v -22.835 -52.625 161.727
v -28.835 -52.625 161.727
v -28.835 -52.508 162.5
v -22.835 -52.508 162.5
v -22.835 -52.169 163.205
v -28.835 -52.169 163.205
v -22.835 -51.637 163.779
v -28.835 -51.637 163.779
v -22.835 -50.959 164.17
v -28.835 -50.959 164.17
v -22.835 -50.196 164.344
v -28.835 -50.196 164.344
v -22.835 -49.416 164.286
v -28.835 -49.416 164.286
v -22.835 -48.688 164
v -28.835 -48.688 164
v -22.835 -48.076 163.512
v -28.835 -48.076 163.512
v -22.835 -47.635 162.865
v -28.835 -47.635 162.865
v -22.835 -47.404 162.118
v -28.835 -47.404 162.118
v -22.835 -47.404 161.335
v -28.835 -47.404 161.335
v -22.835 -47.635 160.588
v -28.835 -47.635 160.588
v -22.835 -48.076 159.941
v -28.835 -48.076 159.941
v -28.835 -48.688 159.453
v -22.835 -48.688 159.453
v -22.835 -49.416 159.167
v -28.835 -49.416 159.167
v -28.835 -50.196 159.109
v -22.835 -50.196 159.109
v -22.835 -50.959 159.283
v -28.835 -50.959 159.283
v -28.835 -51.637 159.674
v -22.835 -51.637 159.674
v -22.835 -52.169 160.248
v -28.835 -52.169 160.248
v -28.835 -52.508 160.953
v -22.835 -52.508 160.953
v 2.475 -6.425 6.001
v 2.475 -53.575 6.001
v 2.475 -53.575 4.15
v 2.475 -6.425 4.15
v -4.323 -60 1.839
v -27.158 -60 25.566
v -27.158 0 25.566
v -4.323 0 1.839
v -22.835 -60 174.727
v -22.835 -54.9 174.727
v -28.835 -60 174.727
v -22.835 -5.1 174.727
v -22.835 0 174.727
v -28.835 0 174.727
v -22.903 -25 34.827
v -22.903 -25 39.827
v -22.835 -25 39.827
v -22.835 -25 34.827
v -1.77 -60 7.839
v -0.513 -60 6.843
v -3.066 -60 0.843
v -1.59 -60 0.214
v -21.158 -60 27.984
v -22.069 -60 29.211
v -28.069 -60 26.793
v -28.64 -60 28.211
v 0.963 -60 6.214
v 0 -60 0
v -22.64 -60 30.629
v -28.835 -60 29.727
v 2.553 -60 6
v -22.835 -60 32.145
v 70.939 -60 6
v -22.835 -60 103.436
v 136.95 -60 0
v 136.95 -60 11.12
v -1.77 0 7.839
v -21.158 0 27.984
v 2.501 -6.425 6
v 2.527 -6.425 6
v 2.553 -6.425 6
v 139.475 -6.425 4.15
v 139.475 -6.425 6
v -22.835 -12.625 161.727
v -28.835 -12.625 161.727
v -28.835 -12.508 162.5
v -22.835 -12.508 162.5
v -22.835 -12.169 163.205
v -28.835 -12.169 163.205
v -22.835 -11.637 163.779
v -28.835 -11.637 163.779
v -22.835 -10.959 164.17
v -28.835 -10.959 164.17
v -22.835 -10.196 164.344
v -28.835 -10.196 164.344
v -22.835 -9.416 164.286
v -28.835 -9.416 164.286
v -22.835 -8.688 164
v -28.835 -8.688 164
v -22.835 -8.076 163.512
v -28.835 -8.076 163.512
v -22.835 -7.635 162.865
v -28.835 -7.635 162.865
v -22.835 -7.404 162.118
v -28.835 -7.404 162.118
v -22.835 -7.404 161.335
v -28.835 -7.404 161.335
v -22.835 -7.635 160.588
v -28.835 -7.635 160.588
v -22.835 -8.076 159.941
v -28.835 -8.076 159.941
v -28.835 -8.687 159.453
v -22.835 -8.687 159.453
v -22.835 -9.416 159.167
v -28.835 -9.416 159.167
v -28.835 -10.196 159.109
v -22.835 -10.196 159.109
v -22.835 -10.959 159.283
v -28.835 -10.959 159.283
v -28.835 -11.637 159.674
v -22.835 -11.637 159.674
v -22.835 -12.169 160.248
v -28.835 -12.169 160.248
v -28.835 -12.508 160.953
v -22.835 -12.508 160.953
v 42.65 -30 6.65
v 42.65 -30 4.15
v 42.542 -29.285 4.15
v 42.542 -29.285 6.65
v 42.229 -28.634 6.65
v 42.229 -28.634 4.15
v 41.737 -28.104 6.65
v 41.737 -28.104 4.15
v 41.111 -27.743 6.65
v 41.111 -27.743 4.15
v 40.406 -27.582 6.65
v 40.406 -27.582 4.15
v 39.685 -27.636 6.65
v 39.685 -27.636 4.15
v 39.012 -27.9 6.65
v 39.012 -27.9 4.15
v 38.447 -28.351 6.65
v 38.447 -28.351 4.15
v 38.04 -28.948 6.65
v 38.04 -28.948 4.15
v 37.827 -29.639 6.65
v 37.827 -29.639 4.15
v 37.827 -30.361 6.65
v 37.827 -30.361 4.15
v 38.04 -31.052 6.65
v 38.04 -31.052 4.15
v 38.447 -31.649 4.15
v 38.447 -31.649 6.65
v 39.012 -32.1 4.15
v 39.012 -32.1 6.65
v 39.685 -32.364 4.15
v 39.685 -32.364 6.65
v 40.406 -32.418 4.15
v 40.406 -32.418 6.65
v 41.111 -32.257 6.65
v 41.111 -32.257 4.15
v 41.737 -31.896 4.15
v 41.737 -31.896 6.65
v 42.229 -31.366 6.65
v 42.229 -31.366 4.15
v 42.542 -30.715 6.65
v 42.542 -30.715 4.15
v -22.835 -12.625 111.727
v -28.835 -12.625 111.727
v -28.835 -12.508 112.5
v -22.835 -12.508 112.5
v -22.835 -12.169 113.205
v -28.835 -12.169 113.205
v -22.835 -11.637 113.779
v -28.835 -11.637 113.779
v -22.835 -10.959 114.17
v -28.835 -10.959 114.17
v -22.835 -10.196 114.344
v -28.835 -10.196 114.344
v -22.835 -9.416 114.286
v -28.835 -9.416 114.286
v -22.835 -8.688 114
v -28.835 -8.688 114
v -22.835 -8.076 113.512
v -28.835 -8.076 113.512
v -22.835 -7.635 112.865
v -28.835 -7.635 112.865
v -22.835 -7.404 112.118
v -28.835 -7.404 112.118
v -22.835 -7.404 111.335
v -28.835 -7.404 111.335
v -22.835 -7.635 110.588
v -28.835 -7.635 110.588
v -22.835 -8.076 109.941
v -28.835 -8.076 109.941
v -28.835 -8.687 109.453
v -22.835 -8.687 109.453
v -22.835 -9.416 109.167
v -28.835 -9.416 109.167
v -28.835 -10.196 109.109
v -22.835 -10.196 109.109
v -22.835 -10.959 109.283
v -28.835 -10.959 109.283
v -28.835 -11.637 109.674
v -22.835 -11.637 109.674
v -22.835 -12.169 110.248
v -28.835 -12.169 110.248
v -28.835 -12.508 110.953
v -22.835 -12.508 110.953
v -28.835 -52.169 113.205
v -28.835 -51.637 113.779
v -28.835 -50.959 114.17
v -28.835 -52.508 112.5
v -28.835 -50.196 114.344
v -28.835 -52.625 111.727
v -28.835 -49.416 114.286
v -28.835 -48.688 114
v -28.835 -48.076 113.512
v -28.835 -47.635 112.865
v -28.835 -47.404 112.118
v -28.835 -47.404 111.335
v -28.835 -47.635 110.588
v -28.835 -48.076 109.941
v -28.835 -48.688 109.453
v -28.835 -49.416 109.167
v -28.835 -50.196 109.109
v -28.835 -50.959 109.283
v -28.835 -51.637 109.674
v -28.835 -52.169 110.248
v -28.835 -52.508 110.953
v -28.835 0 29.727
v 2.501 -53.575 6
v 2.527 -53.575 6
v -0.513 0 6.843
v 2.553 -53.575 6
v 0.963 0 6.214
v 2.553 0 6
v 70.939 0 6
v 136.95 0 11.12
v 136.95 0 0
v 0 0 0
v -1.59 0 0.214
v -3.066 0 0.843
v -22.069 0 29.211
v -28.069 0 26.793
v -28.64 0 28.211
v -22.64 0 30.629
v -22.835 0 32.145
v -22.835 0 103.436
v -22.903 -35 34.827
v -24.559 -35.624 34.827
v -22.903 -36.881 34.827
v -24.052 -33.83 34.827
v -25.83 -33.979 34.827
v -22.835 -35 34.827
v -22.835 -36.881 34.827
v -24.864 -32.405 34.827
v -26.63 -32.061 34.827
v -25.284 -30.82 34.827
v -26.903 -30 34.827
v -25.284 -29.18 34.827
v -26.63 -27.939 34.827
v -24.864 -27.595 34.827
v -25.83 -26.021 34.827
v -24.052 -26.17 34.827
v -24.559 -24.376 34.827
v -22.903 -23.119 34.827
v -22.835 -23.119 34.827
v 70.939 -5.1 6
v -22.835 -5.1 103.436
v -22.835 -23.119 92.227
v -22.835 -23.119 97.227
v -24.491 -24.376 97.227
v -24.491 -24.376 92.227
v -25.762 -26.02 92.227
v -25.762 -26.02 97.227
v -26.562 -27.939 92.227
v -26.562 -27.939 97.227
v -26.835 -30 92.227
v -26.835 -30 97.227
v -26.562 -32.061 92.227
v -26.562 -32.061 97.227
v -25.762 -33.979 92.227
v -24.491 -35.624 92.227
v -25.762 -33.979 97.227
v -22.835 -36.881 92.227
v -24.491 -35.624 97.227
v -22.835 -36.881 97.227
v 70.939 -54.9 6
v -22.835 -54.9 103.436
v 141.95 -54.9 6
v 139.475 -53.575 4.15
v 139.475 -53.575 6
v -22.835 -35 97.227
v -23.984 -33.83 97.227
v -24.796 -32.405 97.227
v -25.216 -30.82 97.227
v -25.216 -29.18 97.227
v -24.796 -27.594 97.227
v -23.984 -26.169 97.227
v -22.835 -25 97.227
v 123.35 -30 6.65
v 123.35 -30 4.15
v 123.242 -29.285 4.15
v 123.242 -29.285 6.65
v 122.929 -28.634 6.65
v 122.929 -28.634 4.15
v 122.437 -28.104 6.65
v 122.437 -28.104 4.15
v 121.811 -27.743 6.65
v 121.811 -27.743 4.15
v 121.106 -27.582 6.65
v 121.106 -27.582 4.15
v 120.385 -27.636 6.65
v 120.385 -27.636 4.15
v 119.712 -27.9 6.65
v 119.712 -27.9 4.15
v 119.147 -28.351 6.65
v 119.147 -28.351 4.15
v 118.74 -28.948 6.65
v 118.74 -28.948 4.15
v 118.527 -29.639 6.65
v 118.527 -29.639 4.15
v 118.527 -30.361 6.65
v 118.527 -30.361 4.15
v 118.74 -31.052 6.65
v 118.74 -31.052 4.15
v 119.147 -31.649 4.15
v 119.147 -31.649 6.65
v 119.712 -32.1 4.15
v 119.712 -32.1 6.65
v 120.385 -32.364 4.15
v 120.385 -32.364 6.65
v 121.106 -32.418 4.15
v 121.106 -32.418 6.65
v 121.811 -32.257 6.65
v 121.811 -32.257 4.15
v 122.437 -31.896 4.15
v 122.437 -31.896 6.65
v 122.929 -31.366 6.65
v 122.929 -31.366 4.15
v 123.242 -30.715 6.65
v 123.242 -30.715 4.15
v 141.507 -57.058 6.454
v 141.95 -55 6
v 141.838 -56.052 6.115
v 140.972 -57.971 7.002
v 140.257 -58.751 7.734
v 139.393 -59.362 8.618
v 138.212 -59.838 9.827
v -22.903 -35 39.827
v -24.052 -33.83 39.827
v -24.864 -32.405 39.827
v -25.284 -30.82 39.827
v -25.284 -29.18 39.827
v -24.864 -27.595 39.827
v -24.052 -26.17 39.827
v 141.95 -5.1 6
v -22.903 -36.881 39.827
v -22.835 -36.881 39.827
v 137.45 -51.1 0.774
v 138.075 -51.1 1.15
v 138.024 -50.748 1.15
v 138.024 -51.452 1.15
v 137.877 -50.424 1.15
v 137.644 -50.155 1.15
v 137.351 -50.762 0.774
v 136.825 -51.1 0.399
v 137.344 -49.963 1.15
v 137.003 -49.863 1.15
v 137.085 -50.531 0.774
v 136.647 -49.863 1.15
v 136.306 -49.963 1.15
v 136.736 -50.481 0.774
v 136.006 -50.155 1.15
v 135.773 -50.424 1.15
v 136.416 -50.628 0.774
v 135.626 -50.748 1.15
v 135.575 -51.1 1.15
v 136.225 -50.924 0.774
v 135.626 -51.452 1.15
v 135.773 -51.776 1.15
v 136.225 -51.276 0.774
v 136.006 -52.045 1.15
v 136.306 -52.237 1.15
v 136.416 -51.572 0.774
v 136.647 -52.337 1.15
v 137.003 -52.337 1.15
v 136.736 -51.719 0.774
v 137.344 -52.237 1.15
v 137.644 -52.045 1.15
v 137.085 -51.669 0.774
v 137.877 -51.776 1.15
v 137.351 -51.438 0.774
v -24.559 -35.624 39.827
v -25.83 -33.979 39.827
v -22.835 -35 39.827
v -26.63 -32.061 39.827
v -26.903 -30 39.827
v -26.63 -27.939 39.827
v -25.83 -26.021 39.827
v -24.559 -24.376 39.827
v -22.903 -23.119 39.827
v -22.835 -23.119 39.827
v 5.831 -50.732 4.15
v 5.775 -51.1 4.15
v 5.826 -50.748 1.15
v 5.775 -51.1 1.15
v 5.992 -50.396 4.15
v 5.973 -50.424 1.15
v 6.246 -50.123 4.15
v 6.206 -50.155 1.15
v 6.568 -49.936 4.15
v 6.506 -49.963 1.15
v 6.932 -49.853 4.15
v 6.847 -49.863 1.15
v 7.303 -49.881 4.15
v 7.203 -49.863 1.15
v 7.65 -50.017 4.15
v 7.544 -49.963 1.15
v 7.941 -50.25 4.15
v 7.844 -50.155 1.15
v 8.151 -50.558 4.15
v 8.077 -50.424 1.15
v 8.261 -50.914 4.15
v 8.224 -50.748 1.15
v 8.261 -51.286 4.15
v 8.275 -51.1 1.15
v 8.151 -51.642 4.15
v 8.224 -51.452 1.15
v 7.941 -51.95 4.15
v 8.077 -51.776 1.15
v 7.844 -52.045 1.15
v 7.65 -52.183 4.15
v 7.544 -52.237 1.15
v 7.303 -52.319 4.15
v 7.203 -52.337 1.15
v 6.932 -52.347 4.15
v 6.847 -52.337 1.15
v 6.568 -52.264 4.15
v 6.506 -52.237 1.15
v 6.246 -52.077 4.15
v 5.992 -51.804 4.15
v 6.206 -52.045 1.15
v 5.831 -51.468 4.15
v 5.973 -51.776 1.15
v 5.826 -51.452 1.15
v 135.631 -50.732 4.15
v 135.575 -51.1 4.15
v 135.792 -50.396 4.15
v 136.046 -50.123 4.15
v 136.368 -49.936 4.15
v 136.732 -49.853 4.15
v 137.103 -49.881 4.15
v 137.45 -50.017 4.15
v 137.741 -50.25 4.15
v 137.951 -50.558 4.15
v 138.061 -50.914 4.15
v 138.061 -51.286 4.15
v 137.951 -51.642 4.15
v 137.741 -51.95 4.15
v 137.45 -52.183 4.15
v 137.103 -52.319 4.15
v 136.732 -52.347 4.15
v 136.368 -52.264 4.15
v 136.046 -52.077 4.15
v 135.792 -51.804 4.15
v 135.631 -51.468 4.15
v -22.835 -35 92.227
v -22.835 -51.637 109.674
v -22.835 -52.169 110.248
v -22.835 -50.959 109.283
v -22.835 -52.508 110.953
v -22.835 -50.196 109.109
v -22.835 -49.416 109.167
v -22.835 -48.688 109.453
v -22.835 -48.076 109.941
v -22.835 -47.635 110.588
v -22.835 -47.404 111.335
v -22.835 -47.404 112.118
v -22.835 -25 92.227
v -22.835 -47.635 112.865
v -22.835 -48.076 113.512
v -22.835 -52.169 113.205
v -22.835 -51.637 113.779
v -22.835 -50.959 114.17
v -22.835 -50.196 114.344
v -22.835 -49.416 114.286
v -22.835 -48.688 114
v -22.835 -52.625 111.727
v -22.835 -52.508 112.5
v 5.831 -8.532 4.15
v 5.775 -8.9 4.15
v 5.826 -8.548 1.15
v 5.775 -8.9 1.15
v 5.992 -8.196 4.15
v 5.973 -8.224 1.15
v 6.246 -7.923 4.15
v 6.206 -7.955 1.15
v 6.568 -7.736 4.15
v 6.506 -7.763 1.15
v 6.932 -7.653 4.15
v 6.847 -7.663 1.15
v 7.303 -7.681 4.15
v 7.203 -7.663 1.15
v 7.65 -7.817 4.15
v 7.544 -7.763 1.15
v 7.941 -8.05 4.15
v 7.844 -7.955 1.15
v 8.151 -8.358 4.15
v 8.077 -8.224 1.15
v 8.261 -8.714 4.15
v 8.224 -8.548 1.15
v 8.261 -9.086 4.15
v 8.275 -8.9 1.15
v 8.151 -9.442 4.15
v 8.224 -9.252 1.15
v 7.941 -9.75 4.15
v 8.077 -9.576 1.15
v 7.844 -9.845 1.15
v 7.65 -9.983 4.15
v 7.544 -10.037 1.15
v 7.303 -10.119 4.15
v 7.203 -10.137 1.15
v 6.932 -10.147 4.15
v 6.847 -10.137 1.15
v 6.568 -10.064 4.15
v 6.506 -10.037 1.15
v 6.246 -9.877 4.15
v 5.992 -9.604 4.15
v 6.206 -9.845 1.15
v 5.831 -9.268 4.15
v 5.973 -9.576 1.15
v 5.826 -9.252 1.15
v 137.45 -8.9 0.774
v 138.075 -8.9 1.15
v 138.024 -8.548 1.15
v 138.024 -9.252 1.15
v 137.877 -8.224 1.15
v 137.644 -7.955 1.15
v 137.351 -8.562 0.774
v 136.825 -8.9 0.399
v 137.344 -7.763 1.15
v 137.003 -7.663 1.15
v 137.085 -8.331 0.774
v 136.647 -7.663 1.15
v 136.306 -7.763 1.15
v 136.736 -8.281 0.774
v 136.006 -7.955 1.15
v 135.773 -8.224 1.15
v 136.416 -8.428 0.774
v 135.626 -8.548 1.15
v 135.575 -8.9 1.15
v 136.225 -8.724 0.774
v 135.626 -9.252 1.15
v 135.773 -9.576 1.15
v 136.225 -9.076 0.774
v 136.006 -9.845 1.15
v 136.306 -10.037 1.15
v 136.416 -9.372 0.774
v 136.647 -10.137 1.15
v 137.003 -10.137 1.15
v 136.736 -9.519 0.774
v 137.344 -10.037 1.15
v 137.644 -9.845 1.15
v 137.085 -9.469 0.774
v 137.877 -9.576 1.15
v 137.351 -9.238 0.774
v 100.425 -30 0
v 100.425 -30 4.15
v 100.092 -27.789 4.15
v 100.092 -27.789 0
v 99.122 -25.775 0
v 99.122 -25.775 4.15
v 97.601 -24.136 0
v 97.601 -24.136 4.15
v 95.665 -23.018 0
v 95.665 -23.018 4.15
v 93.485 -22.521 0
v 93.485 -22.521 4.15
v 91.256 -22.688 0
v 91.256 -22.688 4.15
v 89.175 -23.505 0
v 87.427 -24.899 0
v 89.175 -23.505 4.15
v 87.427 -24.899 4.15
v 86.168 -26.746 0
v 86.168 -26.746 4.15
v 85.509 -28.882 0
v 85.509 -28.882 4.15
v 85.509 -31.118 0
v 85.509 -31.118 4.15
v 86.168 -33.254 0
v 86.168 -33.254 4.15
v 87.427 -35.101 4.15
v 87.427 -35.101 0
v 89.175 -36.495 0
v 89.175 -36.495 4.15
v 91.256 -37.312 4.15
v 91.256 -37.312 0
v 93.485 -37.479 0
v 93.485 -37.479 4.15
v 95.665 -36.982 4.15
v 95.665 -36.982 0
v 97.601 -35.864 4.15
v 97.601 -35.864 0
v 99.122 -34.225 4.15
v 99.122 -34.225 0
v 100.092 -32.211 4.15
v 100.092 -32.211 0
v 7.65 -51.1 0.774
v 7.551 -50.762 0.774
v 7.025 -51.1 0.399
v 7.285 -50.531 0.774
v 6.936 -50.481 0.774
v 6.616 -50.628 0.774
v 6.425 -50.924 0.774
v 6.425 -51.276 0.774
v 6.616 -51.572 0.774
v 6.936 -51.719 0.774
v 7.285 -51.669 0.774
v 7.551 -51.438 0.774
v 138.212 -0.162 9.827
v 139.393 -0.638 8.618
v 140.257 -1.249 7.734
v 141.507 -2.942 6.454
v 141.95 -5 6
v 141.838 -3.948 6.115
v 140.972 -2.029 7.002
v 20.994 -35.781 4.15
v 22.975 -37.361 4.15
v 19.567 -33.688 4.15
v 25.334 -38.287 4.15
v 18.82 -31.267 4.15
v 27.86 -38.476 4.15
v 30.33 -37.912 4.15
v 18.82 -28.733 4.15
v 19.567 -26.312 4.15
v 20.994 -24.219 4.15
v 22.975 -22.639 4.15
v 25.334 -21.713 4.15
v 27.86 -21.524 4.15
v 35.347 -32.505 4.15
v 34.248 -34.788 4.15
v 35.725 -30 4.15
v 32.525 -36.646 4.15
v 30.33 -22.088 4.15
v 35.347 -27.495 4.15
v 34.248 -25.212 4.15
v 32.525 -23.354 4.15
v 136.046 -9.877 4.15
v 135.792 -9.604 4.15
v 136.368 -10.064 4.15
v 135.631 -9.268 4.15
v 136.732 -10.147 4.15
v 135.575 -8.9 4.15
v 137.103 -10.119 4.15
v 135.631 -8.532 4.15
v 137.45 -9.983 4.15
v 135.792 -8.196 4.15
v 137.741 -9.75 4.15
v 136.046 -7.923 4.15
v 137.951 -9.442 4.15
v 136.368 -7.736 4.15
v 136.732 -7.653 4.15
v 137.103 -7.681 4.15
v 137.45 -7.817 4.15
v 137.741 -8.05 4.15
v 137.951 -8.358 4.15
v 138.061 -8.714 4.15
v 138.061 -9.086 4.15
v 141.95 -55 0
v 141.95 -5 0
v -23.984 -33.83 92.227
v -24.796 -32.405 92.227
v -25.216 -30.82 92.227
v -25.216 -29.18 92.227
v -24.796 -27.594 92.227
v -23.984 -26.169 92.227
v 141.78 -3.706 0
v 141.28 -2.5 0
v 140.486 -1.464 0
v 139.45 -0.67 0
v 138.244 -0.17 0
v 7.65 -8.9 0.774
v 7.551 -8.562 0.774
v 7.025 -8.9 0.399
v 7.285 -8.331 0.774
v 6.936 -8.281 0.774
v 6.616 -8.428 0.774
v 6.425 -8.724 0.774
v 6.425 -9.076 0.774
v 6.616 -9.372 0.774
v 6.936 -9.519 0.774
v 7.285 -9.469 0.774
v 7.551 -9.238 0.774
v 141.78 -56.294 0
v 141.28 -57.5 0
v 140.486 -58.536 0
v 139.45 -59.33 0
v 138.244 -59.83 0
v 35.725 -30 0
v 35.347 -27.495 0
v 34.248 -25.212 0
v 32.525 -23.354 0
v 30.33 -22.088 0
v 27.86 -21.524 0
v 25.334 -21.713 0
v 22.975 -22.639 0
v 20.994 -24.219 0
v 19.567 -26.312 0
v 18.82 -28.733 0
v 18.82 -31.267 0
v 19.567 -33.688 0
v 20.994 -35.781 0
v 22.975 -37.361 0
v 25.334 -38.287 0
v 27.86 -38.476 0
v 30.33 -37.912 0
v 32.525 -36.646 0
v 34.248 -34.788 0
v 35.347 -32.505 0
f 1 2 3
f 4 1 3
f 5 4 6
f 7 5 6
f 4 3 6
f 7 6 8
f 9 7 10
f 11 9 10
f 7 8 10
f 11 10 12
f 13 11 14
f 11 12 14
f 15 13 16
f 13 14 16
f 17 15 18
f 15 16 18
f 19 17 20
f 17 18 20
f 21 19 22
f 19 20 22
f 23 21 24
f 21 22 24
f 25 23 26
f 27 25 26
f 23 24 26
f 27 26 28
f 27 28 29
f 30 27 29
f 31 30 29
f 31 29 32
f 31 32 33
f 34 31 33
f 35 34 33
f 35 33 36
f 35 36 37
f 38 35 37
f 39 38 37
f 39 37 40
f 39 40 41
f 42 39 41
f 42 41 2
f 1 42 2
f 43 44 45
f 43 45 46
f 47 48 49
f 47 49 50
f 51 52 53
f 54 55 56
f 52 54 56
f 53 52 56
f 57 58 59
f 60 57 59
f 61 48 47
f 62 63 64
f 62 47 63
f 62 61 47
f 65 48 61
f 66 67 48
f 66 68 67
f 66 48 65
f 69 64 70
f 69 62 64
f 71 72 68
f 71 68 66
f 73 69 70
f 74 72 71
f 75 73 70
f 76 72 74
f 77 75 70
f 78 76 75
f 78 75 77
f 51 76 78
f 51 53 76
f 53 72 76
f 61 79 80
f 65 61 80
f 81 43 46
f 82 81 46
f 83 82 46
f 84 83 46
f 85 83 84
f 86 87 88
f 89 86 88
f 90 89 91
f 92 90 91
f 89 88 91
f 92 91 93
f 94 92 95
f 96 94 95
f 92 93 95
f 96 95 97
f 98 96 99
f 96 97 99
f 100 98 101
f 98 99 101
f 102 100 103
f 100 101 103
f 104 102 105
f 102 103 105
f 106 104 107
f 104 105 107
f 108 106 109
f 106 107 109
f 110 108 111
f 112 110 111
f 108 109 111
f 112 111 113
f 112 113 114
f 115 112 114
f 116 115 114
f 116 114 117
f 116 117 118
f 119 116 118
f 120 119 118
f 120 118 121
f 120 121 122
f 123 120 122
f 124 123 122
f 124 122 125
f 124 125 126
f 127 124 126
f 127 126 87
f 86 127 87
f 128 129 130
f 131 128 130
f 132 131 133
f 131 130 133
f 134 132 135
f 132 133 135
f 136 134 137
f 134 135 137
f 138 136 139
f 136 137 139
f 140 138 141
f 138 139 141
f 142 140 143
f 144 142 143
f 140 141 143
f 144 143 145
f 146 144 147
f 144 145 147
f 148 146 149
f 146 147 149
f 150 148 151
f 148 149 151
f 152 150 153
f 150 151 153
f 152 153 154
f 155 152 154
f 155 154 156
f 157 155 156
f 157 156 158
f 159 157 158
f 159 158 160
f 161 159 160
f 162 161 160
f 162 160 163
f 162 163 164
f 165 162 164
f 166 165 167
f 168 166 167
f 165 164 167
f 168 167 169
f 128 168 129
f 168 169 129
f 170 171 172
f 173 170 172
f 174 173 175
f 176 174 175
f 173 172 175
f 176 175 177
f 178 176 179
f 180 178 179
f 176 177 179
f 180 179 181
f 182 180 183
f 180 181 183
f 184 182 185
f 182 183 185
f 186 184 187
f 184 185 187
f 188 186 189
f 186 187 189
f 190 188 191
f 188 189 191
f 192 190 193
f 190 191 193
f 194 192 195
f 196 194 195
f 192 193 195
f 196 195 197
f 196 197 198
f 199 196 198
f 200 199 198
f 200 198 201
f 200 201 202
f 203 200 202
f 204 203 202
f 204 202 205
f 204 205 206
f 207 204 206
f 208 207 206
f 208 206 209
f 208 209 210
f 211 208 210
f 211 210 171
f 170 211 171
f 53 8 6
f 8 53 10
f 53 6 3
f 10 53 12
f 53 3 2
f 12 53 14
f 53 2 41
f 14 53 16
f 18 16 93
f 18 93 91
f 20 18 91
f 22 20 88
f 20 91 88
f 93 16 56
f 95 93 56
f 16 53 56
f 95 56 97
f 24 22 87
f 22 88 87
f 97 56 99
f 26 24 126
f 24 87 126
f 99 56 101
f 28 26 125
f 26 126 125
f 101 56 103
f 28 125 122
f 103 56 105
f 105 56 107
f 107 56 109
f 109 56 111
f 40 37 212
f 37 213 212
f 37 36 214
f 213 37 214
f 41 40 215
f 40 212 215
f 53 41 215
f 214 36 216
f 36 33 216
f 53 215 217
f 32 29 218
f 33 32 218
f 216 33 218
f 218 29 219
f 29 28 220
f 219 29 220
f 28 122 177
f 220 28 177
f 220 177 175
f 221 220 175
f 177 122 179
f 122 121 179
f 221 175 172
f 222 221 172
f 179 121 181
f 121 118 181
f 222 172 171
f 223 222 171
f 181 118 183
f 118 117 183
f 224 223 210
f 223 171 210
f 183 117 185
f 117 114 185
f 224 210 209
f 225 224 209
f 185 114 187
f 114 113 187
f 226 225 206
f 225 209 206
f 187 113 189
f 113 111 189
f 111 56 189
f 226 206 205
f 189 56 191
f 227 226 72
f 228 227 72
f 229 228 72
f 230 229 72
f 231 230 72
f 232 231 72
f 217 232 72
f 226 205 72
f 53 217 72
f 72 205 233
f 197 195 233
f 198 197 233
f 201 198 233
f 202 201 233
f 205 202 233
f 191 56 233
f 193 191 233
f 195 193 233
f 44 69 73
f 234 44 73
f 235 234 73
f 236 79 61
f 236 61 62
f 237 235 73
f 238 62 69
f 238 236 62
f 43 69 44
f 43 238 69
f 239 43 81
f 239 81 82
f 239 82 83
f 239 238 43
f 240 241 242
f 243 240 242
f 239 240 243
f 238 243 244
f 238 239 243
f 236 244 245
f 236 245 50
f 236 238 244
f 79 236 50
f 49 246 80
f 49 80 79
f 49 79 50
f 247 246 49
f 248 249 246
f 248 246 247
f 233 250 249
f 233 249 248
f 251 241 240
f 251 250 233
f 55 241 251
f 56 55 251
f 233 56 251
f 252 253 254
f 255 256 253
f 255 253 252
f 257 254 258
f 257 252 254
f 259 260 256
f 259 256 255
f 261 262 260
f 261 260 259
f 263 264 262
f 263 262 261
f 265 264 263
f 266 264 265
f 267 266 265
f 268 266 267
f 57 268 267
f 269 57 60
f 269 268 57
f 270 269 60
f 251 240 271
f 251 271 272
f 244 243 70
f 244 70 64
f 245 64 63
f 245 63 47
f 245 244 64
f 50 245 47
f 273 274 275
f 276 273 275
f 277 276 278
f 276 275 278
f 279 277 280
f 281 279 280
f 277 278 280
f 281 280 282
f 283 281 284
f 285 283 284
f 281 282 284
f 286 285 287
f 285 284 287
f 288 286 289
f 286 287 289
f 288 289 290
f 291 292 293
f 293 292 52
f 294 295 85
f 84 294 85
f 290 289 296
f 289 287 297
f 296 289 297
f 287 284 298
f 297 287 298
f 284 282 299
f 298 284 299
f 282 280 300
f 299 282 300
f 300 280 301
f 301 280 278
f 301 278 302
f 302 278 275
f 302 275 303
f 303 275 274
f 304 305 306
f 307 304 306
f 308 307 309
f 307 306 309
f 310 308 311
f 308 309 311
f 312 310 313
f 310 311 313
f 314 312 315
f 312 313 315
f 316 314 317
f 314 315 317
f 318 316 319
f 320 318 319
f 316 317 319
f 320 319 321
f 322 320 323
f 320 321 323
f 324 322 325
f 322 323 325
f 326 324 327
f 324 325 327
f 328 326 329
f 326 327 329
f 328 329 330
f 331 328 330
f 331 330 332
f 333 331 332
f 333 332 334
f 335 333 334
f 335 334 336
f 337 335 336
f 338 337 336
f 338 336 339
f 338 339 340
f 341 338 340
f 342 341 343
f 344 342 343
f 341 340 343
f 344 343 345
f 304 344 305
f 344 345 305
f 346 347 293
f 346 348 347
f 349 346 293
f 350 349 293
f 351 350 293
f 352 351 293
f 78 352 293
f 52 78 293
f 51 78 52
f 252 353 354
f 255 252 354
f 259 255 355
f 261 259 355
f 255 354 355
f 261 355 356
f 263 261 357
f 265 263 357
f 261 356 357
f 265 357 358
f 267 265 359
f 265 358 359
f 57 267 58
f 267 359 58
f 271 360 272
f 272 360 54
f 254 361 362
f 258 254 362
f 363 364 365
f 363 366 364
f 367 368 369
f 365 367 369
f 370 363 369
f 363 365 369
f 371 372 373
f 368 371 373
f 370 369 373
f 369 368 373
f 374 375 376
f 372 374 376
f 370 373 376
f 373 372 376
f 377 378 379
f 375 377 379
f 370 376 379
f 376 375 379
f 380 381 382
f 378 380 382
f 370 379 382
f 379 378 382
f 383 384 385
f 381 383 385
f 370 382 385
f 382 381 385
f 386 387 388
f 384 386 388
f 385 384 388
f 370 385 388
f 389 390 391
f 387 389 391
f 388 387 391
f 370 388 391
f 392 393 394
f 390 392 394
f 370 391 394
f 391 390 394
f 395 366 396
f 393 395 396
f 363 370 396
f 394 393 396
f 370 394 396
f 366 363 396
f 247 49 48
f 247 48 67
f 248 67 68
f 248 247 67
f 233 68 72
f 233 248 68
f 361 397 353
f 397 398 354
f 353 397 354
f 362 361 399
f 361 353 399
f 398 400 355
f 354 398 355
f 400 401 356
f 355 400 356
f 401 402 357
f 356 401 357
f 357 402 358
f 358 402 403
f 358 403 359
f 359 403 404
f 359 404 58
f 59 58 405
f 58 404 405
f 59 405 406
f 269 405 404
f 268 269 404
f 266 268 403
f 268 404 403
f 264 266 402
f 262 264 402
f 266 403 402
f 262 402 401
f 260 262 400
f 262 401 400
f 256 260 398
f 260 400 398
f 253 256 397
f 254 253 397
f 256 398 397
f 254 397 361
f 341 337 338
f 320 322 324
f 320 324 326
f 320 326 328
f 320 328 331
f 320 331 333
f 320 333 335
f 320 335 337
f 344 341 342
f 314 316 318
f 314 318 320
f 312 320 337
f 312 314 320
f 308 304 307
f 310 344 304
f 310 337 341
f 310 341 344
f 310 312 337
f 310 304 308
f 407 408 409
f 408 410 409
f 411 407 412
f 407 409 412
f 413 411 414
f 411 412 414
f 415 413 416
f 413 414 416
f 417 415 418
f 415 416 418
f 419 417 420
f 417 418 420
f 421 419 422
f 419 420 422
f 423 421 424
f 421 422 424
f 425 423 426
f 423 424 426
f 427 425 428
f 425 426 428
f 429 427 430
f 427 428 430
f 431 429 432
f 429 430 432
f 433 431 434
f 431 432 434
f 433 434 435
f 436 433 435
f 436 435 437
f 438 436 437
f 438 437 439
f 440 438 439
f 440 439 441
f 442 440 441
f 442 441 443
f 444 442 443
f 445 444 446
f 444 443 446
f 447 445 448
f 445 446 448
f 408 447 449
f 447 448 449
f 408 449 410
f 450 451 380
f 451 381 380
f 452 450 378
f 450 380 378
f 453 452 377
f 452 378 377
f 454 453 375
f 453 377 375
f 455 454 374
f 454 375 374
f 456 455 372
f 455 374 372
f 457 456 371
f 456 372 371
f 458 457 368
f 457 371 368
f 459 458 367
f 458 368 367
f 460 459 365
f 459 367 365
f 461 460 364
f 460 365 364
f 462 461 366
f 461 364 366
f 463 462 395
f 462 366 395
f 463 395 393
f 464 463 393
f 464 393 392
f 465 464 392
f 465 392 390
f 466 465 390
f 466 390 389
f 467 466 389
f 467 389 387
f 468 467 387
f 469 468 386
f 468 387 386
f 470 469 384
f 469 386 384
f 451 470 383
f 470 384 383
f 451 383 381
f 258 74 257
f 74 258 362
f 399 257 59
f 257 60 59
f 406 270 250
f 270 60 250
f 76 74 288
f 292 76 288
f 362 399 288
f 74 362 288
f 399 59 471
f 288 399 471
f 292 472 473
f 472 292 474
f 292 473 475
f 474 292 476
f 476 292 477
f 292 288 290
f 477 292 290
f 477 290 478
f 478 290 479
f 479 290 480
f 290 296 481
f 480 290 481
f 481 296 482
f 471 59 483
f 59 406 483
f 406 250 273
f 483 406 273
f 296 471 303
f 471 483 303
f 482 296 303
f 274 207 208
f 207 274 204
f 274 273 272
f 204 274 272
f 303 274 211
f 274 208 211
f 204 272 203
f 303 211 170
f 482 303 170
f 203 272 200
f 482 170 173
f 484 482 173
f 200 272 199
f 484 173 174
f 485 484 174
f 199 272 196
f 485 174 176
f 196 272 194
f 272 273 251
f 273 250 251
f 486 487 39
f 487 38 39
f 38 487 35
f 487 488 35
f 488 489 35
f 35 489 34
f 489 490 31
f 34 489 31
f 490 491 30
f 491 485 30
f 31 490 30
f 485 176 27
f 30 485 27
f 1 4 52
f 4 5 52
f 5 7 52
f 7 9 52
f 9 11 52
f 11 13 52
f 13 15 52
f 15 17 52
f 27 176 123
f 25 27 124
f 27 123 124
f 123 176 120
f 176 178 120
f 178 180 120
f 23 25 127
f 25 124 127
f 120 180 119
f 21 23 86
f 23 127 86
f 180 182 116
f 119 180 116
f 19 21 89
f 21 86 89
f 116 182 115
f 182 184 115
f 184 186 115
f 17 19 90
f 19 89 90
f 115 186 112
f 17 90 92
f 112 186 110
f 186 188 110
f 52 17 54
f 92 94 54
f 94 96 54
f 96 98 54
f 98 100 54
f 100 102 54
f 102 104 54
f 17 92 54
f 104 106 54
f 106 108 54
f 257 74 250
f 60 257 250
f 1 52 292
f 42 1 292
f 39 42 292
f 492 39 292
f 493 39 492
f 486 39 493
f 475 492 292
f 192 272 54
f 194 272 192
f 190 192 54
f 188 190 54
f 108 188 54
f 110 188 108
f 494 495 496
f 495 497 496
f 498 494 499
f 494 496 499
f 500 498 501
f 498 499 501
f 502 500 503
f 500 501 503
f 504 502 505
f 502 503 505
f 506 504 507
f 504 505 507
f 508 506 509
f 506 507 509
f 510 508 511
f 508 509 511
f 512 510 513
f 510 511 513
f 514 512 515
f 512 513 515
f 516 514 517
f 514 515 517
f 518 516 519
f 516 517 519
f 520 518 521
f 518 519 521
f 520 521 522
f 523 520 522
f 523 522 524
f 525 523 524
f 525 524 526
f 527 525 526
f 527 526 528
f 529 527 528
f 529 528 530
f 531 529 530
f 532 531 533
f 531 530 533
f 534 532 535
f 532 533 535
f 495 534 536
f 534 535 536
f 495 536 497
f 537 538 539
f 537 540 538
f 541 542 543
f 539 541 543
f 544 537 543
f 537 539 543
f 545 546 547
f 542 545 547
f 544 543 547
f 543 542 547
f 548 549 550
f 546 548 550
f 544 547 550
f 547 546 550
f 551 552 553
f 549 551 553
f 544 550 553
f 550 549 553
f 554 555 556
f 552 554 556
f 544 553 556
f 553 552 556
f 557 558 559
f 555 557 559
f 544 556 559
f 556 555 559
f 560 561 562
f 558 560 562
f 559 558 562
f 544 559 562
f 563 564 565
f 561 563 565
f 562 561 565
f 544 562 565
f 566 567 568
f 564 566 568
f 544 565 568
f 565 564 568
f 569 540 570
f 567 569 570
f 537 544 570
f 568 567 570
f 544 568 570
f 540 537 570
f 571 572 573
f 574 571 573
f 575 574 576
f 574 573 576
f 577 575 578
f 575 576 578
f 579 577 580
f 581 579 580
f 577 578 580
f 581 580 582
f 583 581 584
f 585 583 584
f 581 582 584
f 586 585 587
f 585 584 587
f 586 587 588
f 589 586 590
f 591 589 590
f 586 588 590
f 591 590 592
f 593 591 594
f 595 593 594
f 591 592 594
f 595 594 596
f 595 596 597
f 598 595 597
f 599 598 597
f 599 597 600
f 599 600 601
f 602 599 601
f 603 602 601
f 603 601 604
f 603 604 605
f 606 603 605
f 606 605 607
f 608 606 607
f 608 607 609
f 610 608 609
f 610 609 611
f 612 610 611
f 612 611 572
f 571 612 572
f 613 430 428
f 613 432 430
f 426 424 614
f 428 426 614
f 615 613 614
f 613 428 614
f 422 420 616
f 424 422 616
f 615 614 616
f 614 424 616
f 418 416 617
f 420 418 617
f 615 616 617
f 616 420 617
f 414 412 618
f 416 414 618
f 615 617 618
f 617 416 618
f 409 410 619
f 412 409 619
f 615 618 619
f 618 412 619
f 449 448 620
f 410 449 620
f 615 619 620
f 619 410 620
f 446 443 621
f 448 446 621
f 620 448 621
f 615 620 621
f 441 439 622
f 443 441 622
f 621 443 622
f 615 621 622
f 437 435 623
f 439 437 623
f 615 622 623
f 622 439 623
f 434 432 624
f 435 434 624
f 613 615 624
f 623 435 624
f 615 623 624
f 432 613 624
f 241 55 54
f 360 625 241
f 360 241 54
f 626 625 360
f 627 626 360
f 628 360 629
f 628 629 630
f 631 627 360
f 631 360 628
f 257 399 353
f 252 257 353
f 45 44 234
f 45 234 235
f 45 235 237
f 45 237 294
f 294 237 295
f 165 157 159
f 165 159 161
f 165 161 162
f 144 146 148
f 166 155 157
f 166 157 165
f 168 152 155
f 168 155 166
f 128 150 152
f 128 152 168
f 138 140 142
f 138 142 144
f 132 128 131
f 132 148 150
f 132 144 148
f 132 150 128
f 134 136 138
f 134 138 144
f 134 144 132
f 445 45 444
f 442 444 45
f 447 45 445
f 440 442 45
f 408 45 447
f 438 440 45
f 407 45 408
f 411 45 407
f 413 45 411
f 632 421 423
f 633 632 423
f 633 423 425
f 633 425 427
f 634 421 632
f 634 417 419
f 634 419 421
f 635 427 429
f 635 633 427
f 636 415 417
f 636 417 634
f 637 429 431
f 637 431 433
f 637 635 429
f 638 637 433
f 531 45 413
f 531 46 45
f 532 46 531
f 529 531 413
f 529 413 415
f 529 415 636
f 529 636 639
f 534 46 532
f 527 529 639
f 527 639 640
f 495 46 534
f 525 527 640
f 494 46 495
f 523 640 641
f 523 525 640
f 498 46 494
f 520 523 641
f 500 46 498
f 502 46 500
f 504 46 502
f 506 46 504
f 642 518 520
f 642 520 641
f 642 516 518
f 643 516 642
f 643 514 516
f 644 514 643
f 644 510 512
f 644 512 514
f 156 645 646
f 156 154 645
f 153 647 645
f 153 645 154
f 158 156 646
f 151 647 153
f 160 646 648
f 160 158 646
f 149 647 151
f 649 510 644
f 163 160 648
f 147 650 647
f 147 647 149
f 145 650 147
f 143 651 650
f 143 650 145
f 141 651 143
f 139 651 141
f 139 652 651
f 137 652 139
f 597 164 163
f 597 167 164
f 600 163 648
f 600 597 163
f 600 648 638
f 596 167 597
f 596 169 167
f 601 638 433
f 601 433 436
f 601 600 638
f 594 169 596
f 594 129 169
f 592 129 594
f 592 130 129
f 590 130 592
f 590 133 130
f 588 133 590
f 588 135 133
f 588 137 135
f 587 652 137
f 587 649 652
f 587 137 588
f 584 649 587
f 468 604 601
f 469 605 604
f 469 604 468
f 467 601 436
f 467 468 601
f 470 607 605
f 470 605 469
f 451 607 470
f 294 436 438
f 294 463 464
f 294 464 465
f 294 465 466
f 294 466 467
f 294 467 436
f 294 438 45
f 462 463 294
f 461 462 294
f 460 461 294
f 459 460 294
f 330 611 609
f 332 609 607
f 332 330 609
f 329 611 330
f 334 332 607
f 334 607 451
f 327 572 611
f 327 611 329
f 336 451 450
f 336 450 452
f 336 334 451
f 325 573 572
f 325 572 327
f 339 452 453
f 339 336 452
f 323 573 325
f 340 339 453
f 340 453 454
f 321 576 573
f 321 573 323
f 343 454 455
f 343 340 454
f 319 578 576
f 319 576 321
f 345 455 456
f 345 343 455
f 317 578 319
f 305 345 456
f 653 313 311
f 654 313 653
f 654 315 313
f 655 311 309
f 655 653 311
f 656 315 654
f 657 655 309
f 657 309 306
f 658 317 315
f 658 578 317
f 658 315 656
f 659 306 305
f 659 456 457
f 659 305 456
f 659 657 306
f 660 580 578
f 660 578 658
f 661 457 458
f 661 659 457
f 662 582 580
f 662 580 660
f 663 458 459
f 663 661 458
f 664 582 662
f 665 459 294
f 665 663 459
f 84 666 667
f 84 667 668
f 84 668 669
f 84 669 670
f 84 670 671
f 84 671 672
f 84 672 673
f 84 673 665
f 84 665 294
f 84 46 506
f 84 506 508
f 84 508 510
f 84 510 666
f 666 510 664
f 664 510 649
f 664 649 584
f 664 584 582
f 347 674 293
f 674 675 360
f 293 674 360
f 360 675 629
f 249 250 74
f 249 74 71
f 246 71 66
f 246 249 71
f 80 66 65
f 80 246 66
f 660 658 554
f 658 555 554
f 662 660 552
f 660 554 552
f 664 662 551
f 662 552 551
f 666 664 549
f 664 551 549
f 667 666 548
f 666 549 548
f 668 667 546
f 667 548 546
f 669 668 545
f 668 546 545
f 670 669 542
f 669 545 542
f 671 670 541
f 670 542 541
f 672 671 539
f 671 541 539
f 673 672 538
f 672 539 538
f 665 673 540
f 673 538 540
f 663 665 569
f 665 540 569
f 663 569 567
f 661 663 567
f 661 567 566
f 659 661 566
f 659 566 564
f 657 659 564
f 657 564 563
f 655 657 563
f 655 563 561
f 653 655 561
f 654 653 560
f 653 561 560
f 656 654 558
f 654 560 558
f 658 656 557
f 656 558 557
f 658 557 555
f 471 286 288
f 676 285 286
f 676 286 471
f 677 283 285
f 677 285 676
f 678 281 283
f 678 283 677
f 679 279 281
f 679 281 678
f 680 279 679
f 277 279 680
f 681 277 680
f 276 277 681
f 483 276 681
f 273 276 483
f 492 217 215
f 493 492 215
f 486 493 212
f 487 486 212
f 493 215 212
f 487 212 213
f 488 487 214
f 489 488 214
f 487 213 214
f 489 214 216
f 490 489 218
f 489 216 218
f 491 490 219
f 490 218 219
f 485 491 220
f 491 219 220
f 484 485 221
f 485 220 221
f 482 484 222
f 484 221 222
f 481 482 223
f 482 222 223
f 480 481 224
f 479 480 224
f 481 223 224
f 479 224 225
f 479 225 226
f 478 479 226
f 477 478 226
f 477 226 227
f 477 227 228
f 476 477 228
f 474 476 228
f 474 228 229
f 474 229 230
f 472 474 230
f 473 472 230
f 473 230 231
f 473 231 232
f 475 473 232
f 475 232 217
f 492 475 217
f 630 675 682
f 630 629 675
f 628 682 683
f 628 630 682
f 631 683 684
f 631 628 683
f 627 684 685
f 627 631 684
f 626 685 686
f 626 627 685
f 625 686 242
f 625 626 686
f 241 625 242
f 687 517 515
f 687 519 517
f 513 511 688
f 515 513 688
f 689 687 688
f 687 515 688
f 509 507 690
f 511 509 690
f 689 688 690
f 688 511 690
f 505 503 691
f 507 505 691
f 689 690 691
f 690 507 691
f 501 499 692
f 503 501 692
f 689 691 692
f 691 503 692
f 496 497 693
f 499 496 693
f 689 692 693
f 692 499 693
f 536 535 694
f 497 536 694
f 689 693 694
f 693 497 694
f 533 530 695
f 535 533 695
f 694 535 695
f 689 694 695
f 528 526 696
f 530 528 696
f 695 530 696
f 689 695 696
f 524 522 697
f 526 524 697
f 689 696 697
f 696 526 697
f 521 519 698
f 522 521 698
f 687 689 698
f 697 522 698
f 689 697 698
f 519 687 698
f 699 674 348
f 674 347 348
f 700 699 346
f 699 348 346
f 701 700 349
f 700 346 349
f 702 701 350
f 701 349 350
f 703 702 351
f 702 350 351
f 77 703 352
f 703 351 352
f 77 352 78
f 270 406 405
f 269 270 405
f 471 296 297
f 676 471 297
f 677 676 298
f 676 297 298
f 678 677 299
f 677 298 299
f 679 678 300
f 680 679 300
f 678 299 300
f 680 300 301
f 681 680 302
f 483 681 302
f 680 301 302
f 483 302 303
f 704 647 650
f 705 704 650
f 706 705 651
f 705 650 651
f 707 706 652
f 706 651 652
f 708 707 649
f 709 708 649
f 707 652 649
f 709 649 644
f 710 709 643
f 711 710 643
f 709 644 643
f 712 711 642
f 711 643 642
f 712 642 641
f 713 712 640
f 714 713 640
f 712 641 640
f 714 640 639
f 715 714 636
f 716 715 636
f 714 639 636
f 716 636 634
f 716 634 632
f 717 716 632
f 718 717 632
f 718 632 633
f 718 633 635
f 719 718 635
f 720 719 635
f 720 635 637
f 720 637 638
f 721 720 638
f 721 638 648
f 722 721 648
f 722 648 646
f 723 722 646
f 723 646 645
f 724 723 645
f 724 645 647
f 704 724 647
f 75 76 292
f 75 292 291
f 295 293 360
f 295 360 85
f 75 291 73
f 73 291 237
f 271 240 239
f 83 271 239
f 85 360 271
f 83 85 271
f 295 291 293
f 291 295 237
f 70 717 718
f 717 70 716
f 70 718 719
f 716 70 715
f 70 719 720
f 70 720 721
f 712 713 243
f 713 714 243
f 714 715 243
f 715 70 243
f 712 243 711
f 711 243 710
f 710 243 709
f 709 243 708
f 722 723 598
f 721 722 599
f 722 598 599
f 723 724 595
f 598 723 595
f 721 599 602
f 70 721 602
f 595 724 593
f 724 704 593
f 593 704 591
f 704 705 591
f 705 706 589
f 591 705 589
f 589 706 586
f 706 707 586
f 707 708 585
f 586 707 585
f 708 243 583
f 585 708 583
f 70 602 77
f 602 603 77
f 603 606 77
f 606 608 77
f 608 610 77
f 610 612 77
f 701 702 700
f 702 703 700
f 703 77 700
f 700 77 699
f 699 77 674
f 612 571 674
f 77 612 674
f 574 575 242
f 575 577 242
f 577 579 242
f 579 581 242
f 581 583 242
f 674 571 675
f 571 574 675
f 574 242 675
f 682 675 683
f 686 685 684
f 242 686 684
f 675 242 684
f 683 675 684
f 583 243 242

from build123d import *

# Parameters (mm, degrees)
F1_DEPTH     = 60
F2_W         = 137
F2_H         = 47.15
F3_DEPTH     = 1.85
F5_D         = 2.5
F5_DEPTH     = 3
F5_TIP       = 0.7510757738
F4_R         = 2.425
F6_DEPTH     = 2.5
F8_D         = 5.25
F9_T1_DEPTH  = 60
F9_T6_DEPTH  = 60
F9_T12_DEPTH = 60
F9_T18_DEPTH = 60
F9_T25_DEPTH = 60
F9_T31_DEPTH = 60
F9_T34_DEPTH = 72.0912564168
F9_T36_DEPTH = 72.7642259517
F4_R_2       = 8.5
F4_R_3       = 7.5
F10_DEPTH    = 25
F12_DEPTH    = 5.1
F14_DEPTH    = 5.1
F15_R        = 5
F18_DEPTH    = 2.5
F21_DEPTH    = 2.5


# Not quite as in the source:
# - a fillet or chamfer that OpenCascade refuses, or shapes differently, is made with other operations: its cross-section is extruded or revolved along the edge and cut away or added
# - a feature names something its author has since deleted; it is built from what else it names


with BuildPart() as f1:
    # F0 (on Front) → F1 (new body)
    with BuildSketch(Plane.XZ):
        Polygon((-22.8349631621, 174.7265526258), (-28.8349631621, 174.7265526258), (-28.8349631621, 29.7265526258), (-28.8349631621, 27.3083013424), (-2.5528451903, 0), (0, 0), (141.95, 0), (141.95, 6), (0, 6), (-22.8349631621, 29.7265526258), (-22.8349631621, 151.506786451), align=None)
    extrude(amount=F1_DEPTH)

    # F2 (on face) → F3 (cut)
    with BuildSketch(Plane.XY.offset(6)):
        with Locations((70.975, -30)):
            Rectangle(F2_W, F2_H)
    extrude(amount=-F3_DEPTH, mode=Mode.SUBTRACT)

    # F5
    with Locations(Plane.XY.offset(4.15)):
        with Locations((7.025, -8.9), (136.825, -8.9), (136.825, -51.1), (7.025, -51.1)):
            Hole(F5_D / 2, depth=F5_DEPTH)
            with Locations((0, 0, -(F5_DEPTH + F5_TIP / 2))):  # 118° drill point
                Cone(0, F5_D / 2, F5_TIP, mode=Mode.SUBTRACT)

    # F4 (on face) → F6 (join)
    with BuildSketch(Plane.XY.offset(4.15)):
        with Locations((40.225, -30)):
            Circle(F4_R)
        with Locations((120.925, -30)):
            Circle(F4_R)
    extrude(amount=F6_DEPTH)

    # F8 (through all)
    with Locations(Plane.YZ.offset(-22.8349631621)):
        with Locations((-50, 161.7265526258), (-10, 161.7265526258), (-10, 111.7265526258), (-50, 111.7265526258)):
            Hole(F8_D / 2)

    # F9: fillet of radius 6 on 4 edges, made by hand

    # F9_s2 → F9_t1 (join)
    with BuildSketch(Plane.XZ):
        with BuildLine():
            ThreePointArc((-22.8349631621, 32.1448039092), (-22.3999669258, 29.9018743269), (-21.1580521252, 27.9841667203))
            Line((-21.1580521252, 27.9841667203), (-22.8349631621, 29.7265526258))
            Line((-22.8349631621, 29.7265526258), (-22.8349631621, 32.1448039092))
        make_face()
    extrude(amount=F9_T1_DEPTH)


with BuildPart() as f9_tool4:
    # F9_s5 → F9_t6 (new body)
    with BuildSketch(Plane.XZ):
        with BuildLine():
            ThreePointArc((-1.7702437727, 7.8393628111), (0.2037840091, 6.4789573841), (2.5528451903, 6))
            Line((2.5528451903, 6), (0, 6))
            Line((0, 6), (-1.7702437727, 7.8393628111))
        make_face()
    extrude(amount=F9_T6_DEPTH)

    split(bisect_by=Plane.YZ.offset(2.475), keep=Keep.BOTTOM)

    split(bisect_by=Plane.XZ.offset(6.425), keep=Keep.BOTTOM)


with BuildPart() as f1_1:
    add(f1.part)

    # F9_t3: union F9_tool4
    add(f9_tool4.part)


with BuildPart() as f9_tool10:
    # F9_s11 → F9_t12 (new body)
    with BuildSketch(Plane.XZ):
        with BuildLine():
            ThreePointArc((-1.7702437727, 7.8393628111), (0.2037840091, 6.4789573841), (2.5528451903, 6))
            Line((2.5528451903, 6), (0, 6))
            Line((0, 6), (-1.7702437727, 7.8393628111))
        make_face()
    extrude(amount=F9_T12_DEPTH)

    split(bisect_by=Plane.YZ.offset(2.475), keep=Keep.TOP)

    split(bisect_by=Plane.XZ.offset(6.425), keep=Keep.BOTTOM)


with BuildPart() as f1_2:
    add(f1_1.part)

    # F9_t9: union F9_tool10
    add(f9_tool10.part)


with BuildPart() as f9_tool16:
    # F9_s17 → F9_t18 (new body)
    with BuildSketch(Plane.XZ):
        with BuildLine():
            ThreePointArc((-1.7702437727, 7.8393628111), (0.2037840091, 6.4789573841), (2.5528451903, 6))
            Line((2.5528451903, 6), (0, 6))
            Line((0, 6), (-1.7702437727, 7.8393628111))
        make_face()
    extrude(amount=F9_T18_DEPTH)

    split(bisect_by=Plane.XZ.offset(53.575), keep=Keep.BOTTOM)

    split(bisect_by=Plane.YZ.offset(2.475), keep=Keep.BOTTOM)

    split(bisect_by=Plane.XZ.offset(6.425), keep=Keep.TOP)


with BuildPart() as f1_3:
    add(f1_2.part)

    # F9_t15: union F9_tool16
    add(f9_tool16.part)


with BuildPart() as f9_tool23:
    # F9_s24 → F9_t25 (new body)
    with BuildSketch(Plane.XZ):
        with BuildLine():
            ThreePointArc((-1.7702437727, 7.8393628111), (0.2037840091, 6.4789573841), (2.5528451903, 6))
            Line((2.5528451903, 6), (0, 6))
            Line((0, 6), (-1.7702437727, 7.8393628111))
        make_face()
    extrude(amount=F9_T25_DEPTH)

    split(bisect_by=Plane.XZ.offset(53.575), keep=Keep.TOP)

    split(bisect_by=Plane.YZ.offset(2.475), keep=Keep.BOTTOM)


with BuildPart() as f1_4:
    add(f1_3.part)

    # F9_t22: union F9_tool23
    add(f9_tool23.part)


with BuildPart() as f9_tool29:
    # F9_s30 → F9_t31 (new body)
    with BuildSketch(Plane.XZ):
        with BuildLine():
            ThreePointArc((-1.7702437727, 7.8393628111), (0.2037840091, 6.4789573841), (2.5528451903, 6))
            Line((2.5528451903, 6), (0, 6))
            Line((0, 6), (-1.7702437727, 7.8393628111))
        make_face()
    extrude(amount=F9_T31_DEPTH)

    split(bisect_by=Plane.XZ.offset(53.575), keep=Keep.TOP)

    split(bisect_by=Plane.YZ.offset(2.475), keep=Keep.TOP)


with BuildPart() as f1_5:
    add(f1_4.part)

    # F9_t28: union F9_tool29
    add(f9_tool29.part)

    # F9_s35 → F9_t34 (cut)
    with BuildSketch(Plane.XZ.offset(-6.0456282084)):
        with BuildLine():
            ThreePointArc((-27.1580521252, 25.5659154369), (-28.3999669258, 27.4836230436), (-28.8349631621, 29.7265526258))
            Line((-28.8349631621, 29.7265526258), (-28.8349631621, 27.3083013424))
            Line((-28.8349631621, 27.3083013424), (-27.1580521252, 25.5659154369))
        make_face()
    extrude(amount=F9_T34_DEPTH, mode=Mode.SUBTRACT)

    # F9_s37 → F9_t36 (cut)
    with BuildSketch(Plane.XZ.offset(-6.3821129759)):
        with BuildLine():
            ThreePointArc((0, 0), (-2.3490611813, 0.4789573841), (-4.3230889631, 1.8393628111))
            Line((-4.3230889631, 1.8393628111), (-2.5528451903, 0))
            Line((-2.5528451903, 0), (0, 0))
        make_face()
    extrude(amount=F9_T36_DEPTH, mode=Mode.SUBTRACT)

    # F4 (on face) → F10 (cut)
    with BuildSketch(Plane.XY.offset(4.15)):
        with Locations((27.225, -30)):
            Circle(F4_R_2)
        with Locations((92.925, -30)):
            Circle(F4_R_3)
    extrude(amount=-F10_DEPTH, mode=Mode.SUBTRACT)

    # F11 (on face) → F12 (join)
    with BuildSketch(Plane(origin=(0, 0, 0), x_dir=(-1, 0, 0), z_dir=(0, 1, 0))):
        Polygon((22.8349631621, 103.4356782675), (22.8349631621, 174.7265526258), (-141.95, 6), (-70.9393056499, 6), align=None)
    extrude(amount=-F12_DEPTH)

    # F13 (on face) → F14 (join)
    with BuildSketch(Plane.XZ.offset(60)):
        Polygon((141.95, 6), (-22.8349631621, 174.7265526258), (-22.8349631621, 103.4356782675), (70.9393056499, 6), align=None)
    extrude(amount=-F14_DEPTH)

    # F15
    f15_edges = [f1_5.edges().sort_by_distance(p)[0] for p in [
        (141.95, -60, 3),
        (141.95, 0, 3),
    ]]
    fillet(f15_edges, radius=F15_R)

    # F17 (on line) → F18 (cut, symmetric)
    with BuildSketch(Plane.XY.offset(94.7265526258)):
        with BuildLine():
            Line((-21.5895338884, -23.119), (-22.8349631621, -23.119))
            ThreePointArc((-22.8349631621, -23.119), (-26.8349631621, -29.9997827216), (-22.8349631621, -36.8805654433))
            Line((-22.8349631621, -36.8805654433), (-21.7005347336, -36.8805654433))
            Line((-21.7005347336, -36.8805654433), (-21.7005347336, -34.9997827216))
            Line((-21.7005347336, -34.9997827216), (-22.8349631621, -34.9997827216))
            ThreePointArc((-22.8349631621, -34.9997827216), (-25.2691290512, -29.9997827216), (-22.8349631621, -24.9997827216))
            Line((-22.8349631621, -24.9997827216), (-21.5895338884, -24.9997827216))
            Line((-21.5895338884, -24.9997827216), (-21.5895338884, -23.119))
        make_face()
    extrude(amount=F18_DEPTH, both=True, mode=Mode.SUBTRACT)

    # F20 (on offset) → F21 (cut, symmetric)
    with BuildSketch(Plane.XY.offset(37.3265526258)):
        with BuildLine():
            Line((-21.657592603, -23.1192172784), (-22.9030218767, -23.1192172784))
            ThreePointArc((-22.9030218767, -23.1192172784), (-26.9030218767, -30), (-22.9030218767, -36.8807827216))
            Line((-22.9030218767, -36.8807827216), (-21.7685934482, -36.8807827216))
            Line((-21.7685934482, -36.8807827216), (-21.7685934482, -35))
            Line((-21.7685934482, -35), (-22.9030218767, -35))
            ThreePointArc((-22.9030218767, -35), (-25.3371877657, -30), (-22.9030218767, -25))
            Line((-22.9030218767, -25), (-21.657592603, -25))
            Line((-21.657592603, -25), (-21.657592603, -23.1192172784))
        make_face()
    extrude(amount=F21_DEPTH, both=True, mode=Mode.SUBTRACT)


solid = f1_5.part
